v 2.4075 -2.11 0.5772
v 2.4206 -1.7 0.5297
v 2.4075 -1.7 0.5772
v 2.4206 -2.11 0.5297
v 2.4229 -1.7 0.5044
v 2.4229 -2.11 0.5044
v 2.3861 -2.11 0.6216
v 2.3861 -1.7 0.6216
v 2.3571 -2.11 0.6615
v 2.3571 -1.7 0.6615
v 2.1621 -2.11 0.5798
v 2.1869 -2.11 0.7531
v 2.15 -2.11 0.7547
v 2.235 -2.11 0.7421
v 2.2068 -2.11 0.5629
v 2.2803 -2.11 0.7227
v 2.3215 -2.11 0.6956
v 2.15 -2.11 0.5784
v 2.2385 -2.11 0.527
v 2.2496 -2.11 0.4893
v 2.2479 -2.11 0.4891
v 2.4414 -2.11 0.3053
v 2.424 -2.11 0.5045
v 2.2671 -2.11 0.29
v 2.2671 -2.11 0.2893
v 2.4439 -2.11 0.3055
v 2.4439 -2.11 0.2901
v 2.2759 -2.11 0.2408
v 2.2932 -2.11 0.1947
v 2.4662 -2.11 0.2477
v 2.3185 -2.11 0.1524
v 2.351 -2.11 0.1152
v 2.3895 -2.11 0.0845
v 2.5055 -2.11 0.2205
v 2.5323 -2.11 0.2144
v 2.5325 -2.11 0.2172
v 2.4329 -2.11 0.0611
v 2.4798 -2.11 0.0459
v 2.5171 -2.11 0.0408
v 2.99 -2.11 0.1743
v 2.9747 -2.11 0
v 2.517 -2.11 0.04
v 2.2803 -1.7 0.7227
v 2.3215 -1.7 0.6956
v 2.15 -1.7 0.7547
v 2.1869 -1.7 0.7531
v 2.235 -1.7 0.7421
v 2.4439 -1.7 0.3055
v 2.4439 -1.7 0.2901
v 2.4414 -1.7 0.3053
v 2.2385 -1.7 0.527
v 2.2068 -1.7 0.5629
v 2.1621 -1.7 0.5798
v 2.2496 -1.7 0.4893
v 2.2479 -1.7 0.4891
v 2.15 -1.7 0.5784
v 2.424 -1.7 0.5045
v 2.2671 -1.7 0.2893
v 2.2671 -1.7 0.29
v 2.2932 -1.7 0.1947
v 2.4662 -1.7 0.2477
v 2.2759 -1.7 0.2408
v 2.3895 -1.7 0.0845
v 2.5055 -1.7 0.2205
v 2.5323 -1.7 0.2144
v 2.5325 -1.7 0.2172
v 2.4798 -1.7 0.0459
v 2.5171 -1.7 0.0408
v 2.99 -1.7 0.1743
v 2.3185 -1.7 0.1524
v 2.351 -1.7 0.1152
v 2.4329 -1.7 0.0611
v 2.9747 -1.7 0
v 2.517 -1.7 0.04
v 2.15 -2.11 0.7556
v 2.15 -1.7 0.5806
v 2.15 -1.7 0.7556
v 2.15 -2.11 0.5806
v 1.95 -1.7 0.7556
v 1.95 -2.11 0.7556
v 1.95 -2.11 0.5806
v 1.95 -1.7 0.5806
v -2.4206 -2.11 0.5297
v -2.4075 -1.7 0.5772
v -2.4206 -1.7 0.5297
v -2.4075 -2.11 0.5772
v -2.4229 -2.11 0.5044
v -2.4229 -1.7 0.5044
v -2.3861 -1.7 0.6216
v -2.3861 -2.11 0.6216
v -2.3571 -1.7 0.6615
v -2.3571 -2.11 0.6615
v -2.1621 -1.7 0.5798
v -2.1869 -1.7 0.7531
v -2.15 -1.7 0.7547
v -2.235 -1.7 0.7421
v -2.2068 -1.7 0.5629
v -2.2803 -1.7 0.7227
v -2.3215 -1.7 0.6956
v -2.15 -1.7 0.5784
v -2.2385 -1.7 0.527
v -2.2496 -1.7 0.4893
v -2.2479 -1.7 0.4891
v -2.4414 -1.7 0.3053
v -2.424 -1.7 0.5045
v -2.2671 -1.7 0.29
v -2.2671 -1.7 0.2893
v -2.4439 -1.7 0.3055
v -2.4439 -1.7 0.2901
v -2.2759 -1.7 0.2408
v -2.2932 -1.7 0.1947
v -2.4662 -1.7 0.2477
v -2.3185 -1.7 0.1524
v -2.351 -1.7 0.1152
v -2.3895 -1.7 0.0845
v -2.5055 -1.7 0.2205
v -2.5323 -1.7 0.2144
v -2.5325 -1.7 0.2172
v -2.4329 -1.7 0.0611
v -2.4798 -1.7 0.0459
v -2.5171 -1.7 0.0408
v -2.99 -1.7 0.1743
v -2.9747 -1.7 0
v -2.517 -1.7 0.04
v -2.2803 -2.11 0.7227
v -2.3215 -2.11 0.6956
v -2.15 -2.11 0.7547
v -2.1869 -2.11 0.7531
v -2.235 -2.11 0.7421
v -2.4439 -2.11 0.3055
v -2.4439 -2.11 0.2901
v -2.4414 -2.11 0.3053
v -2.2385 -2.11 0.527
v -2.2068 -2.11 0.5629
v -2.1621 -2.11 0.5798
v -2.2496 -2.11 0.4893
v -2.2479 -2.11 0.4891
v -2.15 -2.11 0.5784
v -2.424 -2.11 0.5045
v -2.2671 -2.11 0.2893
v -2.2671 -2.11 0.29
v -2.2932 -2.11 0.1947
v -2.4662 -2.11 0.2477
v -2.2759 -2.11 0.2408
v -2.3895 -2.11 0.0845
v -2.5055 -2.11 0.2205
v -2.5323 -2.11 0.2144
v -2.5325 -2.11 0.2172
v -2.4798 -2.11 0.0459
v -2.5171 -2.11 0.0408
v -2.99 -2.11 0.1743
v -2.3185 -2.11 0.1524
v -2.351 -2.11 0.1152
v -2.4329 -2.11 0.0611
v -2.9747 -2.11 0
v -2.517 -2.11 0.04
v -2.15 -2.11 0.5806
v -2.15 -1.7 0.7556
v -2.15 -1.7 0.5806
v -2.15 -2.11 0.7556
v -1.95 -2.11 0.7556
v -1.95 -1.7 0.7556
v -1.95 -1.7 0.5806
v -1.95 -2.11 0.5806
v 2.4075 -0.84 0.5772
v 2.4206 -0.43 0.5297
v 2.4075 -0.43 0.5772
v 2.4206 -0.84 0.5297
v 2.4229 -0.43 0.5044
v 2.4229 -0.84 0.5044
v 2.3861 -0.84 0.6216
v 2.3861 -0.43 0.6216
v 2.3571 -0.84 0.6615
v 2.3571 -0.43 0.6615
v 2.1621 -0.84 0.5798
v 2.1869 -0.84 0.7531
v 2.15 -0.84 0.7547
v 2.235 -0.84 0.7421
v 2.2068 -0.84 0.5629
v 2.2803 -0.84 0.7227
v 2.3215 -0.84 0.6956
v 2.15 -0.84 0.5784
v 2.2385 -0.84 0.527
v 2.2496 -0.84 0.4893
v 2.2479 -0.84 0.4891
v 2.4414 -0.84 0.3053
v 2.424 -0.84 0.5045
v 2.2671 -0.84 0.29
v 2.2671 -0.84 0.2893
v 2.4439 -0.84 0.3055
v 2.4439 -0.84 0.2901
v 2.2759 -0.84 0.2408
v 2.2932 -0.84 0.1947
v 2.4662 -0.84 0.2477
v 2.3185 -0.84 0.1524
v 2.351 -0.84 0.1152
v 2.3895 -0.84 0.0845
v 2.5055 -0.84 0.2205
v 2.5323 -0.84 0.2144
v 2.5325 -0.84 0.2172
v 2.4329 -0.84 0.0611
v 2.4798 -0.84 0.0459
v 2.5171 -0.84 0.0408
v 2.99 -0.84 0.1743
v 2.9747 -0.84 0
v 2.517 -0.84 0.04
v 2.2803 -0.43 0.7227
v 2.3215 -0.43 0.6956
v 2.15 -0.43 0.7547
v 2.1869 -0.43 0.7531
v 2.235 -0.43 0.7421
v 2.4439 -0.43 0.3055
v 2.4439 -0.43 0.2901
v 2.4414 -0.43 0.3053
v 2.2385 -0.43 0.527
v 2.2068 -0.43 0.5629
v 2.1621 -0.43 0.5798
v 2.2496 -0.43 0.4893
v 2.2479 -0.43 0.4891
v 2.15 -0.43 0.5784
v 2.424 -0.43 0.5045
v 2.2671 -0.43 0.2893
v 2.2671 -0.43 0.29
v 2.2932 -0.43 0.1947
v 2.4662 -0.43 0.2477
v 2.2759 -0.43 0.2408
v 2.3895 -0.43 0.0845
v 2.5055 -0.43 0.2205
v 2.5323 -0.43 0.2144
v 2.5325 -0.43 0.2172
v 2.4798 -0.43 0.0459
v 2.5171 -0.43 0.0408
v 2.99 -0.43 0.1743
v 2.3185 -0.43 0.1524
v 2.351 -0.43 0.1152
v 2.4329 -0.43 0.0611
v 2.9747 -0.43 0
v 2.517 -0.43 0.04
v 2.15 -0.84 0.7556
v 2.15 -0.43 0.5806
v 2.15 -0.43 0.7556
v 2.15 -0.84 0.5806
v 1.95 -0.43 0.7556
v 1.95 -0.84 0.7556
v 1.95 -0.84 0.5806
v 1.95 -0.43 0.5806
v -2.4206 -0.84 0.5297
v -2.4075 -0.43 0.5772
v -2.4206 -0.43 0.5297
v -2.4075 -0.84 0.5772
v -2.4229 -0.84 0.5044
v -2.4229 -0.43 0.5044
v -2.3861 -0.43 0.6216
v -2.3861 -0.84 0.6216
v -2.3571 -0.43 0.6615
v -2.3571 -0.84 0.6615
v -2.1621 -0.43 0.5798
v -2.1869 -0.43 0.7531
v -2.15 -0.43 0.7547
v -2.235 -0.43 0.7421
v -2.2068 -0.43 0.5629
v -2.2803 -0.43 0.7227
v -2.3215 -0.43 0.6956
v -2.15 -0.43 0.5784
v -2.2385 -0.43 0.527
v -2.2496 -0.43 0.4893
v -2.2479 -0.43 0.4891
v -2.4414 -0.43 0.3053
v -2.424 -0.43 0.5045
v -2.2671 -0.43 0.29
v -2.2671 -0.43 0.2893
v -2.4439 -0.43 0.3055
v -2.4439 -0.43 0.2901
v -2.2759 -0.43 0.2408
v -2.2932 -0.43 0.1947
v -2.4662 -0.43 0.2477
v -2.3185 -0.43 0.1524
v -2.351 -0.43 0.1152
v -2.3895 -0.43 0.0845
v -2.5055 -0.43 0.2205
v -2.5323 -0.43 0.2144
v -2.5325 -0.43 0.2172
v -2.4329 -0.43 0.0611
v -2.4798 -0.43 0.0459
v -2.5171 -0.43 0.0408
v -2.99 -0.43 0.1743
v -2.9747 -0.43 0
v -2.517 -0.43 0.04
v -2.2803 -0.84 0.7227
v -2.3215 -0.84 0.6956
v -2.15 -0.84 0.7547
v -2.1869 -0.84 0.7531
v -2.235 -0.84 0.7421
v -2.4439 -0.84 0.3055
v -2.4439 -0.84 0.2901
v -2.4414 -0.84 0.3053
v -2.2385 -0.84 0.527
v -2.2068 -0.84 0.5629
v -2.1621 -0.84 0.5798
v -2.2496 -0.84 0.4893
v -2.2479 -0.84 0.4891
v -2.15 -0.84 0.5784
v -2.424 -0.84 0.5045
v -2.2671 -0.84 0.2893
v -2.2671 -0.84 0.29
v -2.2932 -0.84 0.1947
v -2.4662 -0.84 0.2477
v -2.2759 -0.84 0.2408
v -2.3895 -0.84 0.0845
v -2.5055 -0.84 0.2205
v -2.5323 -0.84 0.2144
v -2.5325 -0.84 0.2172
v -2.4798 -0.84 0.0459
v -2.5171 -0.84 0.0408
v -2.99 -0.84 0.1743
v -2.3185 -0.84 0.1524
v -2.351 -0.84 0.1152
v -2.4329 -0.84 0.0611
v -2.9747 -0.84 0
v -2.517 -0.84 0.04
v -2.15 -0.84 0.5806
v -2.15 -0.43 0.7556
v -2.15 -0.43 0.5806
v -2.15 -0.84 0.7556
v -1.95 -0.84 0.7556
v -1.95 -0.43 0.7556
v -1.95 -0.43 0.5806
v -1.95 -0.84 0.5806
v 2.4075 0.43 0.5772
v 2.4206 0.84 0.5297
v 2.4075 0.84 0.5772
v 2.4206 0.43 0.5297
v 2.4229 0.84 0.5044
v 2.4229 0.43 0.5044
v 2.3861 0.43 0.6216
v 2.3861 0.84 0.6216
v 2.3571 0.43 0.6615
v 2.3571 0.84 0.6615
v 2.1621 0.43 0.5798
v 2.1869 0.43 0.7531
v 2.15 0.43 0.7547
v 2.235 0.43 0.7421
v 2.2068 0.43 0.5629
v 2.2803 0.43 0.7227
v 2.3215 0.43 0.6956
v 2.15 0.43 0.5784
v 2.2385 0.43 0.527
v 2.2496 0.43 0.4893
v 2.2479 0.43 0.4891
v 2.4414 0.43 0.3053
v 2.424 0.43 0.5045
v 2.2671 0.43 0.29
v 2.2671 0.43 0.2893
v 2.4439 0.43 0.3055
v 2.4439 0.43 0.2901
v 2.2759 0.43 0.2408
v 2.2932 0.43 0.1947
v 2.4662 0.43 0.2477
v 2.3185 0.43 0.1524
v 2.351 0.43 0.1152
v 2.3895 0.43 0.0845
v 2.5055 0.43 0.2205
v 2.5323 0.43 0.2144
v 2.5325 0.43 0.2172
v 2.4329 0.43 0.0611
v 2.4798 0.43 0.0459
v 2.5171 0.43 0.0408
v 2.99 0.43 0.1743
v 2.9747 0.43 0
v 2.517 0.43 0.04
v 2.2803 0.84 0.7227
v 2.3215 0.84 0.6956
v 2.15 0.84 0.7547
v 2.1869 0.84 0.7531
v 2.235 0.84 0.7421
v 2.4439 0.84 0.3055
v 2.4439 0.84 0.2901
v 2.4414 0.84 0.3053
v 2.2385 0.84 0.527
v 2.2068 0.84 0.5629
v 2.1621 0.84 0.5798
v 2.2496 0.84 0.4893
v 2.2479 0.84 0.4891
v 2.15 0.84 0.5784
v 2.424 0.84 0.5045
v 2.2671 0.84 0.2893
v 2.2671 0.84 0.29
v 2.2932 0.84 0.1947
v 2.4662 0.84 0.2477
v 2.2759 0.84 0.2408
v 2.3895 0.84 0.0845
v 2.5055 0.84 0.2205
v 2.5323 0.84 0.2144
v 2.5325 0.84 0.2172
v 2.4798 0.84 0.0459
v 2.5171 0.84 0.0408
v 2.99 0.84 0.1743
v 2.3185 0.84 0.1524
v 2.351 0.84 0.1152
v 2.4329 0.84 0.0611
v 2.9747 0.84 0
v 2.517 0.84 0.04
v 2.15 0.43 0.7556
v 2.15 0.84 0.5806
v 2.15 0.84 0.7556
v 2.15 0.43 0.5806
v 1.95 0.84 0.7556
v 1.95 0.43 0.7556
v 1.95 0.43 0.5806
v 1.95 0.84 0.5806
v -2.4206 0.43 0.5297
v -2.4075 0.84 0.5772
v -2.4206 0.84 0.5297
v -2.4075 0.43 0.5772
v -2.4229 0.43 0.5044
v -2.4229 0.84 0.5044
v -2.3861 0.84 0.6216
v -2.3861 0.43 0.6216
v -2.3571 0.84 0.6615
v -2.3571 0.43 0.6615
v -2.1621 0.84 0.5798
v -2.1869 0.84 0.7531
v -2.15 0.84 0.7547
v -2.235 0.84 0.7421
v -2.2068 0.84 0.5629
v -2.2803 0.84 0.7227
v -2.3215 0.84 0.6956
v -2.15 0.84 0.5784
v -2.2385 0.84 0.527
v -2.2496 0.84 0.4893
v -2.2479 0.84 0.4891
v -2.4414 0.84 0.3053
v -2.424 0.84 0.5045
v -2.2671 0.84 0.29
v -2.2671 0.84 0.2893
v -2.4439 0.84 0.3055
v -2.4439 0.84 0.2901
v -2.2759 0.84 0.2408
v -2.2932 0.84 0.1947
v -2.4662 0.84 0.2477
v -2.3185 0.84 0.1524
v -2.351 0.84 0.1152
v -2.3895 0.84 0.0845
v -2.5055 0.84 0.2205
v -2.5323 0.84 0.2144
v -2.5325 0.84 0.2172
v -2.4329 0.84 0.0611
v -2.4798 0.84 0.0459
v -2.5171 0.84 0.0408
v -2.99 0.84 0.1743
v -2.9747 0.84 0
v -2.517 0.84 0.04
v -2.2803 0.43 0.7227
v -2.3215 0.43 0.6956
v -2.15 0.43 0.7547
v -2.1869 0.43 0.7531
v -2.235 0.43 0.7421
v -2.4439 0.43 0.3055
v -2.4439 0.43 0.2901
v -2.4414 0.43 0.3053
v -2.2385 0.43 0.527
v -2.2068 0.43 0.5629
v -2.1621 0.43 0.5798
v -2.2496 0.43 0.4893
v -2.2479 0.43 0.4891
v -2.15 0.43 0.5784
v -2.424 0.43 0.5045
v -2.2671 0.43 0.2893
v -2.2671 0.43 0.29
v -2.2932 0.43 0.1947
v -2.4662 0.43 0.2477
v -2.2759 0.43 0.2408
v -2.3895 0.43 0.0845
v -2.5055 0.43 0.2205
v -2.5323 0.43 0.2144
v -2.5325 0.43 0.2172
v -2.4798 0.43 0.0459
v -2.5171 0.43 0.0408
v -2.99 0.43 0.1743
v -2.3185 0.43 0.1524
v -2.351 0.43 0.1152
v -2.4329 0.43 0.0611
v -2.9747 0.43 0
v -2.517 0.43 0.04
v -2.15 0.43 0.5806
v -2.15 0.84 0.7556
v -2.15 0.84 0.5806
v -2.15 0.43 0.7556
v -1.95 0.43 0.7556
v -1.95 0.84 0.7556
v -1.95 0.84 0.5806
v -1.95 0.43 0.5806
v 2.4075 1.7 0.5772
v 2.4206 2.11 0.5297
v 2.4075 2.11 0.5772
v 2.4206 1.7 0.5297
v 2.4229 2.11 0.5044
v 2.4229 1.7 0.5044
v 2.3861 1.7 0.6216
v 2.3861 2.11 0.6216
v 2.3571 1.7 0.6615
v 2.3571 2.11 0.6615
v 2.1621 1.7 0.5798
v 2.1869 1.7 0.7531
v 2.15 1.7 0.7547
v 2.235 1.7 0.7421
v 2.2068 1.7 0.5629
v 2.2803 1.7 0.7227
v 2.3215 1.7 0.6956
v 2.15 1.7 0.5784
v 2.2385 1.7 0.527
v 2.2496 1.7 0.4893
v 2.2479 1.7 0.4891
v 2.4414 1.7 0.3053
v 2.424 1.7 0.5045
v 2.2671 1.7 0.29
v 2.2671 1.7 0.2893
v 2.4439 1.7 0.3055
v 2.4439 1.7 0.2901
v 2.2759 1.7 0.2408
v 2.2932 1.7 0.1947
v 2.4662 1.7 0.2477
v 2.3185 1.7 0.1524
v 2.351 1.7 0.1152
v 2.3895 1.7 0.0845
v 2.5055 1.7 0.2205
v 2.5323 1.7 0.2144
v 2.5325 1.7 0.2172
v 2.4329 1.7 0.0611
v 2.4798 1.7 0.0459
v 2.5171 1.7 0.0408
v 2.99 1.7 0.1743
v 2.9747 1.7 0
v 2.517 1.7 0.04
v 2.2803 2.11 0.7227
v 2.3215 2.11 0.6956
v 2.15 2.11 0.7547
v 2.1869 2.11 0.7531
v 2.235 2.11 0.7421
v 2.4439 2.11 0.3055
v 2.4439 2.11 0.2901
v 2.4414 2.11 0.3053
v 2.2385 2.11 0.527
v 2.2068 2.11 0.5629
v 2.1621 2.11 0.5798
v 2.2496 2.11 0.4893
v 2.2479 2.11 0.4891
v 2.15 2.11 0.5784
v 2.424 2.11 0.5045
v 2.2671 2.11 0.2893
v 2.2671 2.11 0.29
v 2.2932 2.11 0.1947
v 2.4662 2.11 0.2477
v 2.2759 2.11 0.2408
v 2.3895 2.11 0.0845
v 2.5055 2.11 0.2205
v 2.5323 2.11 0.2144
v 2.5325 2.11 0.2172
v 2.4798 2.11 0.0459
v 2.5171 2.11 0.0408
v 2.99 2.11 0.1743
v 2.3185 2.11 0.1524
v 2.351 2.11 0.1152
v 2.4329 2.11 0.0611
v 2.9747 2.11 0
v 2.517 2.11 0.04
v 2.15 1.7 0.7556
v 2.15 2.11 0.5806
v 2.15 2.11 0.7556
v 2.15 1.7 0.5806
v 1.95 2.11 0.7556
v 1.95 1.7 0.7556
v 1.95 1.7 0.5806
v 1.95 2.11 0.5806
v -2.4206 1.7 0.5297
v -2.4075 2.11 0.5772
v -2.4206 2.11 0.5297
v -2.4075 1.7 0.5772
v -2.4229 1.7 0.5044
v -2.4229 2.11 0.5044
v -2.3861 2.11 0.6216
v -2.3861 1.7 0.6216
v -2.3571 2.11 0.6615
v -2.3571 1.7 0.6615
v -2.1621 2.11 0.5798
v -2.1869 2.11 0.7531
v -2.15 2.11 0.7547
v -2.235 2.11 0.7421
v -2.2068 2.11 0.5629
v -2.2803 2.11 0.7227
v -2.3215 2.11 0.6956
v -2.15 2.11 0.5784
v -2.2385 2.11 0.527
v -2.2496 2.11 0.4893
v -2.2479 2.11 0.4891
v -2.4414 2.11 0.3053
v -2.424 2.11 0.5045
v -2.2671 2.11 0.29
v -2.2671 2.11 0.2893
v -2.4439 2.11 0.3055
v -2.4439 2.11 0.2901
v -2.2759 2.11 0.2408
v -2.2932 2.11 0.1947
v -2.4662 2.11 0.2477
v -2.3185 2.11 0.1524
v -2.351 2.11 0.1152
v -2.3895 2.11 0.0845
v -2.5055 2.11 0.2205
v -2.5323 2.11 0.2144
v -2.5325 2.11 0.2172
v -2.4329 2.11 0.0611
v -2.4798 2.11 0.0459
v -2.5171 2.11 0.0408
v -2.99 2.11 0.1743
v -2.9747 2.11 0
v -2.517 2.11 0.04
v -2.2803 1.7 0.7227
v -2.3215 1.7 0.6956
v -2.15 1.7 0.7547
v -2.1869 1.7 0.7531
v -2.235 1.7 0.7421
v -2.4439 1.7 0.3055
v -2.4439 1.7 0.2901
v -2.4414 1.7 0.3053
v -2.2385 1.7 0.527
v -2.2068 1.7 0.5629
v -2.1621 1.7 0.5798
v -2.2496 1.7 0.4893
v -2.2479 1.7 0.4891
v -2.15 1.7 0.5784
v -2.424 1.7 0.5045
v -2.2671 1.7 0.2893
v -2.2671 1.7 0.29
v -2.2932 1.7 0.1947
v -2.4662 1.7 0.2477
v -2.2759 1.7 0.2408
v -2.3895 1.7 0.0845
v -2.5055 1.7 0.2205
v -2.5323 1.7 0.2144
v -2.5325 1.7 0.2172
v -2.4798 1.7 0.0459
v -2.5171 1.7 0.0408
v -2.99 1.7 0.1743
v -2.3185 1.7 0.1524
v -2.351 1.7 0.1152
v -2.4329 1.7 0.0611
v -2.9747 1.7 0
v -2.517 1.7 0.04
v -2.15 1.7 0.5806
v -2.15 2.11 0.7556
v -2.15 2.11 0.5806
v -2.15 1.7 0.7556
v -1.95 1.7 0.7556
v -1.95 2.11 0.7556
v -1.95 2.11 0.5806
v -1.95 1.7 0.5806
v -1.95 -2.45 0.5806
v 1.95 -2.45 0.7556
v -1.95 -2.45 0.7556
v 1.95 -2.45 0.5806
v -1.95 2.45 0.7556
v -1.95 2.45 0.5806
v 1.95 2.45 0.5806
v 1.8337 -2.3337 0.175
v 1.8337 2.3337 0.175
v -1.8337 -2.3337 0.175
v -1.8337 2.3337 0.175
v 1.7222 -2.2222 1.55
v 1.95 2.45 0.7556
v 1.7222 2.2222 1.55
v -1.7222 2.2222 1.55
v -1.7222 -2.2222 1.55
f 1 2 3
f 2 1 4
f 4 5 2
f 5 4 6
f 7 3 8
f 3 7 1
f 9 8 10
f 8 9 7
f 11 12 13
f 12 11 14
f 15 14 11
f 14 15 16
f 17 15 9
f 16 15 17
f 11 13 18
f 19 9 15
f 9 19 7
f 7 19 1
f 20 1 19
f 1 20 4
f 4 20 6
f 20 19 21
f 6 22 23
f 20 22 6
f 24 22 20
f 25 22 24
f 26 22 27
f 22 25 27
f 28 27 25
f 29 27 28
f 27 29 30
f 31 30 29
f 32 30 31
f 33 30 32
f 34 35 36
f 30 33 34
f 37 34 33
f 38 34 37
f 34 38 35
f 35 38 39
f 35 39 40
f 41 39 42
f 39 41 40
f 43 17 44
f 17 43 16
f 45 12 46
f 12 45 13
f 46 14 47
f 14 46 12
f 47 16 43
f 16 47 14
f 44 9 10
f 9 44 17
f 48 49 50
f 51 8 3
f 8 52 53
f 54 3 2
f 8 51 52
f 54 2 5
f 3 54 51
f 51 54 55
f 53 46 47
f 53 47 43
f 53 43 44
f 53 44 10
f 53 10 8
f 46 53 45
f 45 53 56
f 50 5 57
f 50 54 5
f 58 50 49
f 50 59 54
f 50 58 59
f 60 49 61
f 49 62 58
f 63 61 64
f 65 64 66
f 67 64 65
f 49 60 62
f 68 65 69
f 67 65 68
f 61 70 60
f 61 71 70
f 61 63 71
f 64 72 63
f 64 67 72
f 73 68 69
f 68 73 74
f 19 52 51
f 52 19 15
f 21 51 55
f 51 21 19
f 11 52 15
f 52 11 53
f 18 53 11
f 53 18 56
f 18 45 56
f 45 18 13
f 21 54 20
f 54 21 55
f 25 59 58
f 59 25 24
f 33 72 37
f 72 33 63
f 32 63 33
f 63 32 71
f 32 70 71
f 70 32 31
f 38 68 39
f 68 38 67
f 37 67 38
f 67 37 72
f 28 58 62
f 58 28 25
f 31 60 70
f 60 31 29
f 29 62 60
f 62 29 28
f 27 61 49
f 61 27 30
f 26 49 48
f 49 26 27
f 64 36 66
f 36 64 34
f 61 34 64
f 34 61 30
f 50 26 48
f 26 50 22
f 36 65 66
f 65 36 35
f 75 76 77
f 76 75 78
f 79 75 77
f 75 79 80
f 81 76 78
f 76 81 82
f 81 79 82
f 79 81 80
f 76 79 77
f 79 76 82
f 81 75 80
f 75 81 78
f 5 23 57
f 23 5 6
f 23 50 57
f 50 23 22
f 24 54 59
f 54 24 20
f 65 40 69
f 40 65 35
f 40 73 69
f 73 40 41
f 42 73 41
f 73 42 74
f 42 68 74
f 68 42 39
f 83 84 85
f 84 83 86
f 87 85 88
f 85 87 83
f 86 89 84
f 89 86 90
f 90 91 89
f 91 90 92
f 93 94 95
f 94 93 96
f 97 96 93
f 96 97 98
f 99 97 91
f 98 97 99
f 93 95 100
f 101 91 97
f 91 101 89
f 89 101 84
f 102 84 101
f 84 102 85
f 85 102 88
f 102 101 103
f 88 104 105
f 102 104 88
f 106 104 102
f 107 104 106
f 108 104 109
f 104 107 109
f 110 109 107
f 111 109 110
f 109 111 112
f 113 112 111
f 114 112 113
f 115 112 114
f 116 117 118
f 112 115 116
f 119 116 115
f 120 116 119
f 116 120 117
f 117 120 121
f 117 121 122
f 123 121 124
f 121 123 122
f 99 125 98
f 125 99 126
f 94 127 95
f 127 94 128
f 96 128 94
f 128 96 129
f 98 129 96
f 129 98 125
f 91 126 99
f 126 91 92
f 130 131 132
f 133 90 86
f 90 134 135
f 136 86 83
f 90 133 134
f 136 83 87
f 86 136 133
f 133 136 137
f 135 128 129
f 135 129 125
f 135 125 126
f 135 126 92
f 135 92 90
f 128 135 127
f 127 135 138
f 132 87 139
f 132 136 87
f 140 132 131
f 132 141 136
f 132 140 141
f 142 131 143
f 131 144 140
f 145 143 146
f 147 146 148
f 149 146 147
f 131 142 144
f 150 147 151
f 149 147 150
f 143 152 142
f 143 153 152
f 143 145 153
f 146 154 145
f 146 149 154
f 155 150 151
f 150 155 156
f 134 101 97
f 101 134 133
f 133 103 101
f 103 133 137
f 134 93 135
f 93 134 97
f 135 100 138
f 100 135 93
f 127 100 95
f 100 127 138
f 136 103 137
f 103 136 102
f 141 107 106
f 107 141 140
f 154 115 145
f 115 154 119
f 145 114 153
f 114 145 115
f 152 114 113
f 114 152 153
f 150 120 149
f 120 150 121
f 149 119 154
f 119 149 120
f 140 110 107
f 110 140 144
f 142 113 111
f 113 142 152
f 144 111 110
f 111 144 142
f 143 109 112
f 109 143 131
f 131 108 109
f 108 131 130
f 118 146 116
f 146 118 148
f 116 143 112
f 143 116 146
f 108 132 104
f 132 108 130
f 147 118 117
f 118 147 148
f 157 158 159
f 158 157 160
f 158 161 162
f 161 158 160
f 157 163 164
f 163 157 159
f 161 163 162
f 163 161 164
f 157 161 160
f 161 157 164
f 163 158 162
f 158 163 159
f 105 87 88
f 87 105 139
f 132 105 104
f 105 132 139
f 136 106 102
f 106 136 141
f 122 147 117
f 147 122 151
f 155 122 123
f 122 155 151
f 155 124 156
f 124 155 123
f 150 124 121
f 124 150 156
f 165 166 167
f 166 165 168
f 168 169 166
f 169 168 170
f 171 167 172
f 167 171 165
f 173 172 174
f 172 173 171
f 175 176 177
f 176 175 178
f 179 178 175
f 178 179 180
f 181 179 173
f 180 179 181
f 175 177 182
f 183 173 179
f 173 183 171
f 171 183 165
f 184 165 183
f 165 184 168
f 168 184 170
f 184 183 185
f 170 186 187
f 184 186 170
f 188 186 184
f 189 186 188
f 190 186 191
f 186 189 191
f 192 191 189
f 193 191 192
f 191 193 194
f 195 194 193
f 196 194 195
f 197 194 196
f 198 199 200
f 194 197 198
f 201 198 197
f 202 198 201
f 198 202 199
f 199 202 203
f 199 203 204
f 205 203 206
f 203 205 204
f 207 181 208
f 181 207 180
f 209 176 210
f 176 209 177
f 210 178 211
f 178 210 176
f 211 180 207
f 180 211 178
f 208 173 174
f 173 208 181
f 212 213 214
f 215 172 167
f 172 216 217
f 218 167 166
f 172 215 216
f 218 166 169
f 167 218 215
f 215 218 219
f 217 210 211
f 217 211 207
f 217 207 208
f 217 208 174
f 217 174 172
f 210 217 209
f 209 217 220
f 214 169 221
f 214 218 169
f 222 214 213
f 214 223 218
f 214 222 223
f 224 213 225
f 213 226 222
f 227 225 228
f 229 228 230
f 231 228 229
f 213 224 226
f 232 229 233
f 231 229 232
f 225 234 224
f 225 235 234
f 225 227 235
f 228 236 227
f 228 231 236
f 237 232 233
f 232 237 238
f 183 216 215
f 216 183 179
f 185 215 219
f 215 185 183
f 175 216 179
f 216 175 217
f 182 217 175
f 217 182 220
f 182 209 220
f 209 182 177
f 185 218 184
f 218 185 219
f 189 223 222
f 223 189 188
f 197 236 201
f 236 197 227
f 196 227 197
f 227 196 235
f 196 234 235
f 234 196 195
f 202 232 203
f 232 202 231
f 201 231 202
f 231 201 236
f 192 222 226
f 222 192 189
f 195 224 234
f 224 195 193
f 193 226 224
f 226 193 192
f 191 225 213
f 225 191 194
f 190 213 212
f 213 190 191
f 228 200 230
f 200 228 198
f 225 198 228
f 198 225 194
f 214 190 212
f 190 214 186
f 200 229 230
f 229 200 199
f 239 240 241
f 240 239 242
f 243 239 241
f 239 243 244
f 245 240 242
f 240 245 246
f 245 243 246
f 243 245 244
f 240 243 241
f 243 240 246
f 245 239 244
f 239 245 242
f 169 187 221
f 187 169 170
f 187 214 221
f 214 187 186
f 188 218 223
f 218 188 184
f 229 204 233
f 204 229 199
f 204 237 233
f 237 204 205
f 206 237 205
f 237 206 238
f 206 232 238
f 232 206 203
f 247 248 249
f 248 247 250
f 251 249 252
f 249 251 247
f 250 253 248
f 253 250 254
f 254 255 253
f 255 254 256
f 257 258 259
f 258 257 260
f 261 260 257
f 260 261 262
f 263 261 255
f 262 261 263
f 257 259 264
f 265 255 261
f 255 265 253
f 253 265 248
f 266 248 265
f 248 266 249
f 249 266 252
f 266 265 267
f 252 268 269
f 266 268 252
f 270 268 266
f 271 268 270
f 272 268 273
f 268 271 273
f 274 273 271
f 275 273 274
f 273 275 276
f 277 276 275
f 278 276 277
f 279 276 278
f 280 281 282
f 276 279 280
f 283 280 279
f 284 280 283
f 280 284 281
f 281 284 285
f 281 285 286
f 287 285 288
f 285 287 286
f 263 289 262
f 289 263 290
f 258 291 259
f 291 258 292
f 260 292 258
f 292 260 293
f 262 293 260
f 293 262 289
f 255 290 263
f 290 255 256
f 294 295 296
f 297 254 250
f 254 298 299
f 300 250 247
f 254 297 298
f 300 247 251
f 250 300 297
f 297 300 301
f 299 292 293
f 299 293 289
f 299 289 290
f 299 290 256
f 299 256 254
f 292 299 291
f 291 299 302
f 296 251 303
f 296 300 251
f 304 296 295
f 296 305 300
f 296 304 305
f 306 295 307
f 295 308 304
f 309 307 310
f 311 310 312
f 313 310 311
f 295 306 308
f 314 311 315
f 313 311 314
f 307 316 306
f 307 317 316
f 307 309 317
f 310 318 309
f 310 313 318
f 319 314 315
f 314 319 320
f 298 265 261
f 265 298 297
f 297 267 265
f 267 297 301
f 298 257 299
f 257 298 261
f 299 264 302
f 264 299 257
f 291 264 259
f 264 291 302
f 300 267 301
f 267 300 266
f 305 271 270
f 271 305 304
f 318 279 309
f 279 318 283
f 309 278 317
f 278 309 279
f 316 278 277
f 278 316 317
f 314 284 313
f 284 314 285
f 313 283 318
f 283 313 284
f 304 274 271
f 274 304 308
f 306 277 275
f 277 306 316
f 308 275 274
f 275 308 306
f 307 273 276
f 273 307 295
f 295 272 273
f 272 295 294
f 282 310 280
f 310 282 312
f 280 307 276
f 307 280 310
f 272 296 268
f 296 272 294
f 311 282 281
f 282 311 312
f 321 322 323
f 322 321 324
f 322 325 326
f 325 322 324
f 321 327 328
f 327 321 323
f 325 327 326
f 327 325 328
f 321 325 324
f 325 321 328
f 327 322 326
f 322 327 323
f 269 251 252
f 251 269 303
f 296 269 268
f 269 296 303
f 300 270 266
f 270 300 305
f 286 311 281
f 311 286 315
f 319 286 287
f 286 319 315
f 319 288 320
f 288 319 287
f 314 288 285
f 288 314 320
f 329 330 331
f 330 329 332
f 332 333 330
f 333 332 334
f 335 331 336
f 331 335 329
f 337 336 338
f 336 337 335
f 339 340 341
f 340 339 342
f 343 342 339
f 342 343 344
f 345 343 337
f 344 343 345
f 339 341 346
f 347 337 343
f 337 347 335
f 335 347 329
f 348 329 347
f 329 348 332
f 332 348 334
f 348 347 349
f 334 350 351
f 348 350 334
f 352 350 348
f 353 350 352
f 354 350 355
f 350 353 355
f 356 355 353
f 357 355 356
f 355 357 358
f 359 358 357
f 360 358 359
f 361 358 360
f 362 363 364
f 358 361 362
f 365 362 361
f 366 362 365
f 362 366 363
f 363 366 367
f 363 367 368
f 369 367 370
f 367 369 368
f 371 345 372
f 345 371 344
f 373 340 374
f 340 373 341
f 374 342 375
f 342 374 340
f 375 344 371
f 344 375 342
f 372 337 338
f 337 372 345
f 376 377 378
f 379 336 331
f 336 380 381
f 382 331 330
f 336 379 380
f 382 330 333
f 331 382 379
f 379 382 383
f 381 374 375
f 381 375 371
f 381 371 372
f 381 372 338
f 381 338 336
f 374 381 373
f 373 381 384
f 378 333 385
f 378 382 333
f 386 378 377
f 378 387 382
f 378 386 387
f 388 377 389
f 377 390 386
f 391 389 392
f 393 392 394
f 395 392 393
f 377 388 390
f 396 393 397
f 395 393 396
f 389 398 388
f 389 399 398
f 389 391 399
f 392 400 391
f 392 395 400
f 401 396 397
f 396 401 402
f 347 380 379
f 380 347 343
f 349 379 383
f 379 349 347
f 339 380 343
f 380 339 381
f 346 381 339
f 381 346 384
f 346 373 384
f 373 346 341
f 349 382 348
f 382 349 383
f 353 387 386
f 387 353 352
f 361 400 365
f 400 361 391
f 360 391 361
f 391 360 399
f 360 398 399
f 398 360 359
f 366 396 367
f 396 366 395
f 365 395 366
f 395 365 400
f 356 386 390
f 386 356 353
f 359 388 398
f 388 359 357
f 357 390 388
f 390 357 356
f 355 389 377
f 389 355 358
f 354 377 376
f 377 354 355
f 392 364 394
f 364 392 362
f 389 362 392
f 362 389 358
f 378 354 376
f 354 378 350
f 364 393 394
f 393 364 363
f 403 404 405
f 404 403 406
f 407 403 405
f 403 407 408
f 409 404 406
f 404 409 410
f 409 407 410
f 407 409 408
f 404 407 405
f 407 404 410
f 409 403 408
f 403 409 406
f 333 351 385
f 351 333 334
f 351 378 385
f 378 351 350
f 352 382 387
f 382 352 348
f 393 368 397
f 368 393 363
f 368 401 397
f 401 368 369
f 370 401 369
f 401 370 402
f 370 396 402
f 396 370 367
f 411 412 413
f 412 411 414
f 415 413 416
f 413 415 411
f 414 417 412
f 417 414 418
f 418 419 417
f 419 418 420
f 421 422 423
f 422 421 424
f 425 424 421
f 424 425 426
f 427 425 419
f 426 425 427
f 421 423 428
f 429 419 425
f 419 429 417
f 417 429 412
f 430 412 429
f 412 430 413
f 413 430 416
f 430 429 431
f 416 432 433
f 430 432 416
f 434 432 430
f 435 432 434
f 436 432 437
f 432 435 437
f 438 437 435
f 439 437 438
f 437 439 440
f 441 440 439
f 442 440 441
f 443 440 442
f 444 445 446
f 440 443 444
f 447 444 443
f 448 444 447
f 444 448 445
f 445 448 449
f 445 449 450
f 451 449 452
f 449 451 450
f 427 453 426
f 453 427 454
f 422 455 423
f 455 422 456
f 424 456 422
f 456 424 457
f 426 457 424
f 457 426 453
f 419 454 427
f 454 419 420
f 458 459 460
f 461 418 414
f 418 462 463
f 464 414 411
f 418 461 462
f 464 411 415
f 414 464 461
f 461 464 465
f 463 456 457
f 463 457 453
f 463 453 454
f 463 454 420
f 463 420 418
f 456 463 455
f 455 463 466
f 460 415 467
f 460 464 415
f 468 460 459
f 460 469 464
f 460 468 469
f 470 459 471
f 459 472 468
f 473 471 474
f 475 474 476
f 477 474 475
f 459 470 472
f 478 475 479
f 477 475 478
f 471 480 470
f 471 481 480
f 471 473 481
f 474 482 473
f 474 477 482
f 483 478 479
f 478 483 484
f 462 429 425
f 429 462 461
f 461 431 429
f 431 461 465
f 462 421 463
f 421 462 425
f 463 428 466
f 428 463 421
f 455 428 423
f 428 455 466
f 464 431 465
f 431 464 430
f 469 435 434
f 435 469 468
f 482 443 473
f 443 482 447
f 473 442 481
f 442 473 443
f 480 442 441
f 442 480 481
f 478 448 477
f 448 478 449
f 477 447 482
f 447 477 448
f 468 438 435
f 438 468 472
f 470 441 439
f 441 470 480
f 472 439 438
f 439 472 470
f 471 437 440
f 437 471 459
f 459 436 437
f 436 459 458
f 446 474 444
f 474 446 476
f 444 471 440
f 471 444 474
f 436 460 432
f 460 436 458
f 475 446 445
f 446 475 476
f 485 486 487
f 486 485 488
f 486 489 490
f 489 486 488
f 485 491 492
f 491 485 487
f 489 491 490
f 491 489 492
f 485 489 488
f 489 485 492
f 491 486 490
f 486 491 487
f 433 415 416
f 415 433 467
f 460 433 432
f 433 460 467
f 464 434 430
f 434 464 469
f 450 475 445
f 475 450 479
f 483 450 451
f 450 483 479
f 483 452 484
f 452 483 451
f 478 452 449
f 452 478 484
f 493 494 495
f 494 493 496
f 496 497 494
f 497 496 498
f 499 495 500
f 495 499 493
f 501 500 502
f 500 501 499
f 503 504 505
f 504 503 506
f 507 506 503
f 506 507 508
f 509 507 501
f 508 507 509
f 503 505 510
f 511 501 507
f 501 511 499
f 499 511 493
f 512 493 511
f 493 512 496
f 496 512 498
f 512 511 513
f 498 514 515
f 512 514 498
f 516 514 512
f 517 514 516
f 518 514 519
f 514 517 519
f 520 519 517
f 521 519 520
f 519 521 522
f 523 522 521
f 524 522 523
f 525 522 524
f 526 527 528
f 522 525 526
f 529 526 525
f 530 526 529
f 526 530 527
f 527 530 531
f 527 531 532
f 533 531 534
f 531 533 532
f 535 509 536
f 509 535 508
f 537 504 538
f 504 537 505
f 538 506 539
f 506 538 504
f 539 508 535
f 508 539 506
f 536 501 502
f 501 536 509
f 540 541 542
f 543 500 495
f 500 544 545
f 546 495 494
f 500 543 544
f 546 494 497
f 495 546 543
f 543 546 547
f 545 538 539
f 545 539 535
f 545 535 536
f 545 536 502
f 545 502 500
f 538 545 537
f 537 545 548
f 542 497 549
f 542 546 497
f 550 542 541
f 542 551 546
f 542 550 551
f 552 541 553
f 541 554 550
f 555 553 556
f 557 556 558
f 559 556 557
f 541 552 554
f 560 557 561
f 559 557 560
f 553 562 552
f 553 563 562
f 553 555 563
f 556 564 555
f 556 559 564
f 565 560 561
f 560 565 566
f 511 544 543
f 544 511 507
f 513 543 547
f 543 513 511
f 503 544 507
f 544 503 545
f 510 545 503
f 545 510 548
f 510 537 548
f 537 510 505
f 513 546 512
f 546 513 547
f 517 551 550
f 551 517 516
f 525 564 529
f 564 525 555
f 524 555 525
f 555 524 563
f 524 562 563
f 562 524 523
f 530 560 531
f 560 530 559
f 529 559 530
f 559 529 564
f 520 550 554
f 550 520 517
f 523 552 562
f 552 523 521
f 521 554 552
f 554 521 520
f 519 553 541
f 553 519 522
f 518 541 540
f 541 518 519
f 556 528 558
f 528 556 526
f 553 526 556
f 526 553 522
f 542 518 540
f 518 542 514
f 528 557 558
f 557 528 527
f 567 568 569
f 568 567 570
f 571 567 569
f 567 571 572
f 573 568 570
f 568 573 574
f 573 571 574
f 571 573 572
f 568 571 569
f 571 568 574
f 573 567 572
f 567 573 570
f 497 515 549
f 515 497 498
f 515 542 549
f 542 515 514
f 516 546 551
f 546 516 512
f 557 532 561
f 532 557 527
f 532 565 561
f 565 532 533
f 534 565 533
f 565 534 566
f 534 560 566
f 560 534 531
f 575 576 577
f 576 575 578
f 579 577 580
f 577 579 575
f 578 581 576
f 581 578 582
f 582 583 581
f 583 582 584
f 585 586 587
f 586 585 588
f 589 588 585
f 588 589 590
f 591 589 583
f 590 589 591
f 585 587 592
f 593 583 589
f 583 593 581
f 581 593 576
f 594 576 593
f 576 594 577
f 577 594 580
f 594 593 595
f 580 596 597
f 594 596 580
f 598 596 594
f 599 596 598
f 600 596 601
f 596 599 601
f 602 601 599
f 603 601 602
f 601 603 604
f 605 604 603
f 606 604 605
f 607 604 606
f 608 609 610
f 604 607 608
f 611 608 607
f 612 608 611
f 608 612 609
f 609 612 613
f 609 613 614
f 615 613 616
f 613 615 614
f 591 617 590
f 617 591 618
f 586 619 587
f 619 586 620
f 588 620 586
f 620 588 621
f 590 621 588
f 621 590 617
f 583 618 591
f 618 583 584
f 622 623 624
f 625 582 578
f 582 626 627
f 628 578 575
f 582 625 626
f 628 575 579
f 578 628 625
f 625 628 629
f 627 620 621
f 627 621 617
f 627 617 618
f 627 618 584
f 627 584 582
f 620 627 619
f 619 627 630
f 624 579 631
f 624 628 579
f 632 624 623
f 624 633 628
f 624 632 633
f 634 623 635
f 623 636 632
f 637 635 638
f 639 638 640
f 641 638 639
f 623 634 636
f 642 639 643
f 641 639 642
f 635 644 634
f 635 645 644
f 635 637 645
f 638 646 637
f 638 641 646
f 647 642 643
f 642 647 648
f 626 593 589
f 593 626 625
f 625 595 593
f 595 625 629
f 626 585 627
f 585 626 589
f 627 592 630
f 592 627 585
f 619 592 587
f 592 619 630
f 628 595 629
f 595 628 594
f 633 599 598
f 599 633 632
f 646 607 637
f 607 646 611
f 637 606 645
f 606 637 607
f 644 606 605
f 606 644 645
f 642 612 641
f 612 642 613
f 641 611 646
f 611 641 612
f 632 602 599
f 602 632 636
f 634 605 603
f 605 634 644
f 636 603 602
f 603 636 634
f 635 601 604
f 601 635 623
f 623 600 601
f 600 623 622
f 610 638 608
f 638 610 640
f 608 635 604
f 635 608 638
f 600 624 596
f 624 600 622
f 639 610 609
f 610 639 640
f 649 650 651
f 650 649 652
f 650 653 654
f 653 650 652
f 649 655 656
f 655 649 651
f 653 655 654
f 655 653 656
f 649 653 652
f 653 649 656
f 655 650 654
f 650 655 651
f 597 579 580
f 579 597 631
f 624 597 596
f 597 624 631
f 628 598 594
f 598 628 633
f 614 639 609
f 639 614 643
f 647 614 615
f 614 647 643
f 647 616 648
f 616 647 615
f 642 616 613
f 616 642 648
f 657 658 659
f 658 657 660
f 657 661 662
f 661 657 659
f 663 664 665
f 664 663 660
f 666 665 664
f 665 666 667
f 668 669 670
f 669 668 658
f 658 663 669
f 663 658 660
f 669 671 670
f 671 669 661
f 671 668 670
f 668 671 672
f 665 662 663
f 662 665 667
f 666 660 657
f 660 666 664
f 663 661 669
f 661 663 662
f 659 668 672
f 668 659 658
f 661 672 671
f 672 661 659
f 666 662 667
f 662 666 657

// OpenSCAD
//SMD SOIC IC
//Based on JEDEC MS-012 Issue F Variation AB
// https://github.com/Mechabotix/OpenSCAD

module RenderSOIC(pins)
{
    if((pins < 8) || (pins >16))
    {
        pins = 14; //Set pins to 14 if out of range
    }
    
    D = (((pins/2)-1)*1.25008)+1.14976; //Length of body - depends on number of pins - estimated from Spec


    E1 = 3.9; //Body width
    A1 = 0.175; //body clearance above floor. 0.1 Min. 0.15 Max.
    A = 1.55; //Height of top of body above floor. 1.35 Min.  1.75 Max.
    E = 6; //Width of body + legs
    e = 1.27; //BSC distance between adjacent legs
    b = 0.41; //width of leg leads
    c = 0.175; //height of leg leads
    R = 0.1; //Radius of leg turn > 0.07
    L1 = 1.04; //The total horizontal length of the leg
    Theta = 5; //degrees of theta 1 - the angle the legs rise off the ground
    Theta1 = 4; //4 x Theta1 is degrees the side edges of the body tilt in. Maximim 8 deg.
    Theta2 = 5; //degrees of theta 2 - the angle of the middle section from vertical

    //Other Dimensions
    LegSection1 = 0.2; //The first section from the side of the body
    LegSection2 = 0.2; //The second straight section

    // **** Calculations for Leg Module ****
    //Calculate how far to displace the centre of Leg Section 2 from origin
    LegSection2Hyp = sqrt(((LegSection2/2)*(LegSection2/2))+((c/2)*(c/2)));
    ThetaSection2 = atan(LegSection2/c);
    ThetaSection2Center = ThetaSection2 - Theta2;
    LegSection2CenterX = LegSection1 + (R*cos(Theta2)) + (LegSection2Hyp * cos(ThetaSection2Center));
    LegSection2CenterZ = (c/2) + R - (R*sin(Theta2)) + (LegSection2Hyp * sin(ThetaSection2Center));

    //Leg Bend 2 Calculations
    ThetaBend2 = 90-Theta2-Theta;
    LegBend2XTrans = LegSection1 + (R*cos(Theta2)) + 2*(LegSection2Hyp * cos(ThetaSection2Center))+(R*cos(Theta2));
    LegBend2YTrans = (c/2) + R - (R*sin(Theta2)) + 2*(LegSection2Hyp * sin(ThetaSection2Center))-(R*sin(Theta2));

    //Leg Section 3 Calculations (Needs Fixing)
    XOriginToLeg3Left = (LegSection1 + (R*cos(Theta2)) + 2*(LegSection2Hyp * cos(ThetaSection2Center))+(R*cos(Theta2)))-((R+c)*sin(Theta));
    LegSection3Horizintal = L1 - (c*sin(Theta)) - (XOriginToLeg3Left); //which equals LegSection3*Cos(Theta)
    LegSection3 = LegSection3Horizintal / cos(Theta);

    ThetaP = atan((R+(c/2))/(LegSection3/2));
    ThetaQ = 90 - ThetaP - Theta;
    LegSection3deltaHyp = sqrt(((R+(c/2))*(R+(c/2)))+((LegSection3/2)*(LegSection3/2)));
    LegSection3deltaX = LegSection3deltaHyp * sin(ThetaQ); //X distance from centre of bend2 to centre of LegSection3
    LegSection3deltaY = LegSection3deltaHyp * cos(ThetaQ); //Y distance from centre of bend2 to centre of LegSection3
    LegSection3XTrans = LegBend2XTrans + LegSection3deltaX;
    LegSection3ZTrans = LegBend2YTrans + LegSection3deltaY;

    //calculate distace from origin to bottom of leg section 3 so the pin can be shifted up the z-axis
    LegZTranslate = LegSection3ZTrans + (c/2)*cos(Theta) + (LegSection3/2)*sin(Theta);

    module AddLeg(x,y,rotZ)
    {
        //This module creates a leg/pin.
        


        //IC Leg
        color("LightGrey")
        translate([x,y,LegZTranslate])//translate leg based on values passed to module
        rotate([0,0,rotZ])//rotate the leg around Z based on values passed to module
        union()
        {
            //Leg Section 1
            translate([LegSection1/2,0,0])
                cube([LegSection1,b,c], center = true);

            //Leg Bend 1 - 
            translate([LegSection1,0,-(R+(c/2))])
                rotate([90,0,0])
                    difference()
                    {
                        difference()
                        {
                           difference()
                            {
                                difference()
                                {
                                    //Radius corner for leg
                                    cylinder(r=(R+c), h=b, $fa=1, $fs=0.05, center = true);
                                    cylinder(r=R, h=(b+0.1), $fa=1, $fs=0.05, center = true);
                                }
                                //Clear off the left side of the cylinder to make a 90 deg angle
                                translate ([-(((2*R)+c)/2),0,0]) //shift -x direction by 1/2 the width of the block
                                    cube([((2*R)+c),((4*R)+c),b+0.1], center = true);
                            }
                            //Create a block angled up 5 degrees
                            rotate([0,0,Theta2])
                                translate ([((2*R)+c)/2,-((2*R)+c)/2,0])
                                    cube([((2*R)+c),((2*R)+c),b+0.2], center = true);
                        }
                        //Clear out any remaining parts of the cylinder in the bottom half
                        translate([0,-(((2*R)+c)/2),0])//shift -y direction by 1/2 the height of the block
                            rotate([0,0,0])
                                cube([((4*R)+c),((2*R)+c),b+0.3], center= true);   
                    };
                    
            //Leg Section 2
            translate([LegSection2CenterX,0,-LegSection2CenterZ])
                  rotate([0,-Theta2,0])
                    cube([c,b,LegSection2], center = true);
                    
            //Leg Bend 2
            translate([LegBend2XTrans,0,-LegBend2YTrans])
                rotate([90,0,0])
                    difference()
                    {
                        difference()
                        {
                            //Radius corner for leg
                            cylinder(r=(R+c), h=b, $fa=1, $fs=0.05, center = true);
                            cylinder(r=R, h=(b+0.1), $fa=1, $fs=0.05, center = true);
                        }
                        union()
                        {
                            translate([0,(R+c+0.05)/2,0])
                                cube([2*(R+c+0.05),(R+c+0.05),b+0.15], center = true);

                            translate([((R+c+0.05)/2),-((R+c+0.05)/2),0])
                                cube([(R+c+0.05),(R+c+0.055),b+0.15], center = true);

                            translate([0,0,-(b+0.15)/2])
                                rotate([0,0,90+Theta])
                                    cube([(R+c+0.05),(R+c+0.05),b+0.15], center = false);

                            translate([0,0,-(b+0.15)/2])
                                rotate([0,0,-(90+Theta2)])
                                    cube([(R+c+0.05),(R+c+0.05),b+0.15], center = false);
                        }
                    };

            //Leg Section 3
            translate([LegSection3XTrans,0,-LegSection3ZTrans])
                rotate([0,Theta,0])
                    cube([LegSection3,b,c], center = true);
        }
    }



    //Add Legs using module
    for (p = [1:(pins/2)])
    {
        AddLeg(E1/2,(e*p)-(((pins/2)*e/2)+e/2),0);
        AddLeg(-E1/2,(e*p)-(((pins/2)*e/2)+e/2),180);
    }

    //Polyhedron Body

    //Inset Calculations for top and bottom of body
    InsetT = tan(4*Theta1) * (A-(LegZTranslate + (c/2)));
    InsetB = tan(4*Theta1) * (LegZTranslate - ((c/2)+A1));

    color("DarkSlateGrey")
    polyhedron(
    points=
    [
        [E1/2-InsetT,D/2-InsetT,A],[E1/2-InsetT,-(D/2-InsetT),A],[-(E1/2-InsetT),-(D/2-InsetT),A],[-(E1/2-InsetT),(D/2-InsetT),A], //top
        [E1/2,D/2,LegZTranslate+(c/2)],[E1/2,-D/2,LegZTranslate+(c/2)],[-E1/2,-D/2,LegZTranslate+(c/2)],[-E1/2,D/2,LegZTranslate+(c/2)],
        [E1/2,D/2,LegZTranslate-(c/2)],[E1/2,-D/2,LegZTranslate-(c/2)],[-E1/2,-D/2,LegZTranslate-(c/2)],[-E1/2,D/2,LegZTranslate-(c/2)],
        [E1/2-InsetB,D/2-InsetB,A1],[E1/2-InsetB,-(D/2-InsetB),A1],[-(E1/2-InsetB),-(D/2-InsetB),A1],[-(E1/2-InsetB),D/2-InsetB,A1] //bottom
    ],
    faces =
    [
        [0,1,3],[1,2,3], //Top
        [0,4,5],[0,5,1],[1,5,6],[1,6,2],[2,6,3],[3,6,7],[3,4,0],[3,7,4],
        [4,8,9],[4,9,5],[5,9,10],[5,10,6],[6,10,11],[6,11,7],[7,8,4],[7,11,8], //sides where pins exit
        [8,12,13],[8,13,9],[9,13,14],[9,14,10],[10,14,15],[10,15,11],[11,15,12],[11,12,8],
        [12,15,13],[13,15,14] //Bottom
    ]
    );
}
RenderSOIC(8);
